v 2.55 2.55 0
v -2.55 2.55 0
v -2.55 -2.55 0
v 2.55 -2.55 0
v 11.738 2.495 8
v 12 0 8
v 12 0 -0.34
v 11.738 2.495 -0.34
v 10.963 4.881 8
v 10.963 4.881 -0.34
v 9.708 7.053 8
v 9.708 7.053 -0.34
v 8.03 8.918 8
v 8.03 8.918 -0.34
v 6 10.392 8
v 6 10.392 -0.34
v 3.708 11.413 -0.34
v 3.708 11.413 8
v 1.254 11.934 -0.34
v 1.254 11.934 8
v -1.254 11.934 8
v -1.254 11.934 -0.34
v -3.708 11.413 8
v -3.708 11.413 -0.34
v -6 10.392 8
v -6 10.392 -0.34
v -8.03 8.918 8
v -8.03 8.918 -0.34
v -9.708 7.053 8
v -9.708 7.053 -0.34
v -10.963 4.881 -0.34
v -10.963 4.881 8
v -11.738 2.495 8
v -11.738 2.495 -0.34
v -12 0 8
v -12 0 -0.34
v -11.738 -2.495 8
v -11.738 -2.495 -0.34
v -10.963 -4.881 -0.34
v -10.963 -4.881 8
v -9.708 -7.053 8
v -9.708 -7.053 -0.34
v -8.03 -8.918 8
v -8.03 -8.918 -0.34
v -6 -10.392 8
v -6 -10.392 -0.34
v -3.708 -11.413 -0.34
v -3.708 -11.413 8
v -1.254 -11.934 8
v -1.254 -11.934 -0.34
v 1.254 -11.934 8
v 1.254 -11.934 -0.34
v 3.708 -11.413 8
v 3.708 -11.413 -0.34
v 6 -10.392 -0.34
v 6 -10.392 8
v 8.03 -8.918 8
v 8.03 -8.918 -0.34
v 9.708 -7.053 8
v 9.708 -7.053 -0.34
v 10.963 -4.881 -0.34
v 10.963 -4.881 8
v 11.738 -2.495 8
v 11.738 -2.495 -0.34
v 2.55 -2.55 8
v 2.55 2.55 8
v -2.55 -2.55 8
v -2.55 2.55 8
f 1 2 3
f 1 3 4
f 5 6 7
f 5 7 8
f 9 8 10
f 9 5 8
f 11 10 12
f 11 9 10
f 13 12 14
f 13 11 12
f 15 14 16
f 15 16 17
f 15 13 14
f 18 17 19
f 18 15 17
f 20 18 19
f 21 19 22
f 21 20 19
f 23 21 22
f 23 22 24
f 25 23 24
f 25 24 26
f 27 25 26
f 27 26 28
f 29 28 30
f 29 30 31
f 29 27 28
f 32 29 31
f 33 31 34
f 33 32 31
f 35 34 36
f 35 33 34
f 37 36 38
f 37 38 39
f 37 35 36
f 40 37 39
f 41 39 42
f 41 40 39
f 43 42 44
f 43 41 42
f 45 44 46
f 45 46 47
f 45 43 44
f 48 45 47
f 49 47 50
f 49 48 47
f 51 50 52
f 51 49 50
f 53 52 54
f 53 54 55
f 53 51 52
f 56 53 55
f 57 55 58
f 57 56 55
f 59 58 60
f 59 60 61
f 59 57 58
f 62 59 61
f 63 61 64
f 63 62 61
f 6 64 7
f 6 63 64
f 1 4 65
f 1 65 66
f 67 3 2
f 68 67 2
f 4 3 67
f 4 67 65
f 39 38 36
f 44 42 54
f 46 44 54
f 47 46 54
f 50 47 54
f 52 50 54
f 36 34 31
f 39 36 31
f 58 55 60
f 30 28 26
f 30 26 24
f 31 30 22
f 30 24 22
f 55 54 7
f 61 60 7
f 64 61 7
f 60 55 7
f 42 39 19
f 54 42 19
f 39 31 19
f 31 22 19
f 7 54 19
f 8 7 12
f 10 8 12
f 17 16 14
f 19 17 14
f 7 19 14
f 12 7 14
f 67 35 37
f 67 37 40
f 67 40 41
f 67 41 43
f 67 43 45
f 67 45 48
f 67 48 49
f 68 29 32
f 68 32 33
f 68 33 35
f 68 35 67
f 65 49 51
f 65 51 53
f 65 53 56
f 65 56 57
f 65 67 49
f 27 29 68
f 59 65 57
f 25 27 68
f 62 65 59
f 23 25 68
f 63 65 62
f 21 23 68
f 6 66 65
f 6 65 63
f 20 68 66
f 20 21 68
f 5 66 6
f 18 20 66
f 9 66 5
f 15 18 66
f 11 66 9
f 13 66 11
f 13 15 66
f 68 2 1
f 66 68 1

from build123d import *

# Parameters (mm, degrees)
BOSS_EXTRUDE1_START = 8
SKETCH1_R           = 12
BOSS_EXTRUDE1_DEPTH = 8.34
SKETCH3_W           = 5.1
SKETCH3_H           = 5.1
CUT_EXTRUDE4_DEPTH  = 9


with BuildPart() as part:
    # Sketch1 → Boss-Extrude1 (new body)
    with BuildSketch(Plane.XY.offset(BOSS_EXTRUDE1_START)):
        Circle(SKETCH1_R)
    extrude(amount=-BOSS_EXTRUDE1_DEPTH)

    # Sketch3 → Cut-Extrude4 (cut, through all)
    with BuildSketch(Plane.XY):
        Rectangle(SKETCH3_W, SKETCH3_H)
    extrude(amount=CUT_EXTRUDE4_DEPTH, mode=Mode.SUBTRACT)


solid = part.part
